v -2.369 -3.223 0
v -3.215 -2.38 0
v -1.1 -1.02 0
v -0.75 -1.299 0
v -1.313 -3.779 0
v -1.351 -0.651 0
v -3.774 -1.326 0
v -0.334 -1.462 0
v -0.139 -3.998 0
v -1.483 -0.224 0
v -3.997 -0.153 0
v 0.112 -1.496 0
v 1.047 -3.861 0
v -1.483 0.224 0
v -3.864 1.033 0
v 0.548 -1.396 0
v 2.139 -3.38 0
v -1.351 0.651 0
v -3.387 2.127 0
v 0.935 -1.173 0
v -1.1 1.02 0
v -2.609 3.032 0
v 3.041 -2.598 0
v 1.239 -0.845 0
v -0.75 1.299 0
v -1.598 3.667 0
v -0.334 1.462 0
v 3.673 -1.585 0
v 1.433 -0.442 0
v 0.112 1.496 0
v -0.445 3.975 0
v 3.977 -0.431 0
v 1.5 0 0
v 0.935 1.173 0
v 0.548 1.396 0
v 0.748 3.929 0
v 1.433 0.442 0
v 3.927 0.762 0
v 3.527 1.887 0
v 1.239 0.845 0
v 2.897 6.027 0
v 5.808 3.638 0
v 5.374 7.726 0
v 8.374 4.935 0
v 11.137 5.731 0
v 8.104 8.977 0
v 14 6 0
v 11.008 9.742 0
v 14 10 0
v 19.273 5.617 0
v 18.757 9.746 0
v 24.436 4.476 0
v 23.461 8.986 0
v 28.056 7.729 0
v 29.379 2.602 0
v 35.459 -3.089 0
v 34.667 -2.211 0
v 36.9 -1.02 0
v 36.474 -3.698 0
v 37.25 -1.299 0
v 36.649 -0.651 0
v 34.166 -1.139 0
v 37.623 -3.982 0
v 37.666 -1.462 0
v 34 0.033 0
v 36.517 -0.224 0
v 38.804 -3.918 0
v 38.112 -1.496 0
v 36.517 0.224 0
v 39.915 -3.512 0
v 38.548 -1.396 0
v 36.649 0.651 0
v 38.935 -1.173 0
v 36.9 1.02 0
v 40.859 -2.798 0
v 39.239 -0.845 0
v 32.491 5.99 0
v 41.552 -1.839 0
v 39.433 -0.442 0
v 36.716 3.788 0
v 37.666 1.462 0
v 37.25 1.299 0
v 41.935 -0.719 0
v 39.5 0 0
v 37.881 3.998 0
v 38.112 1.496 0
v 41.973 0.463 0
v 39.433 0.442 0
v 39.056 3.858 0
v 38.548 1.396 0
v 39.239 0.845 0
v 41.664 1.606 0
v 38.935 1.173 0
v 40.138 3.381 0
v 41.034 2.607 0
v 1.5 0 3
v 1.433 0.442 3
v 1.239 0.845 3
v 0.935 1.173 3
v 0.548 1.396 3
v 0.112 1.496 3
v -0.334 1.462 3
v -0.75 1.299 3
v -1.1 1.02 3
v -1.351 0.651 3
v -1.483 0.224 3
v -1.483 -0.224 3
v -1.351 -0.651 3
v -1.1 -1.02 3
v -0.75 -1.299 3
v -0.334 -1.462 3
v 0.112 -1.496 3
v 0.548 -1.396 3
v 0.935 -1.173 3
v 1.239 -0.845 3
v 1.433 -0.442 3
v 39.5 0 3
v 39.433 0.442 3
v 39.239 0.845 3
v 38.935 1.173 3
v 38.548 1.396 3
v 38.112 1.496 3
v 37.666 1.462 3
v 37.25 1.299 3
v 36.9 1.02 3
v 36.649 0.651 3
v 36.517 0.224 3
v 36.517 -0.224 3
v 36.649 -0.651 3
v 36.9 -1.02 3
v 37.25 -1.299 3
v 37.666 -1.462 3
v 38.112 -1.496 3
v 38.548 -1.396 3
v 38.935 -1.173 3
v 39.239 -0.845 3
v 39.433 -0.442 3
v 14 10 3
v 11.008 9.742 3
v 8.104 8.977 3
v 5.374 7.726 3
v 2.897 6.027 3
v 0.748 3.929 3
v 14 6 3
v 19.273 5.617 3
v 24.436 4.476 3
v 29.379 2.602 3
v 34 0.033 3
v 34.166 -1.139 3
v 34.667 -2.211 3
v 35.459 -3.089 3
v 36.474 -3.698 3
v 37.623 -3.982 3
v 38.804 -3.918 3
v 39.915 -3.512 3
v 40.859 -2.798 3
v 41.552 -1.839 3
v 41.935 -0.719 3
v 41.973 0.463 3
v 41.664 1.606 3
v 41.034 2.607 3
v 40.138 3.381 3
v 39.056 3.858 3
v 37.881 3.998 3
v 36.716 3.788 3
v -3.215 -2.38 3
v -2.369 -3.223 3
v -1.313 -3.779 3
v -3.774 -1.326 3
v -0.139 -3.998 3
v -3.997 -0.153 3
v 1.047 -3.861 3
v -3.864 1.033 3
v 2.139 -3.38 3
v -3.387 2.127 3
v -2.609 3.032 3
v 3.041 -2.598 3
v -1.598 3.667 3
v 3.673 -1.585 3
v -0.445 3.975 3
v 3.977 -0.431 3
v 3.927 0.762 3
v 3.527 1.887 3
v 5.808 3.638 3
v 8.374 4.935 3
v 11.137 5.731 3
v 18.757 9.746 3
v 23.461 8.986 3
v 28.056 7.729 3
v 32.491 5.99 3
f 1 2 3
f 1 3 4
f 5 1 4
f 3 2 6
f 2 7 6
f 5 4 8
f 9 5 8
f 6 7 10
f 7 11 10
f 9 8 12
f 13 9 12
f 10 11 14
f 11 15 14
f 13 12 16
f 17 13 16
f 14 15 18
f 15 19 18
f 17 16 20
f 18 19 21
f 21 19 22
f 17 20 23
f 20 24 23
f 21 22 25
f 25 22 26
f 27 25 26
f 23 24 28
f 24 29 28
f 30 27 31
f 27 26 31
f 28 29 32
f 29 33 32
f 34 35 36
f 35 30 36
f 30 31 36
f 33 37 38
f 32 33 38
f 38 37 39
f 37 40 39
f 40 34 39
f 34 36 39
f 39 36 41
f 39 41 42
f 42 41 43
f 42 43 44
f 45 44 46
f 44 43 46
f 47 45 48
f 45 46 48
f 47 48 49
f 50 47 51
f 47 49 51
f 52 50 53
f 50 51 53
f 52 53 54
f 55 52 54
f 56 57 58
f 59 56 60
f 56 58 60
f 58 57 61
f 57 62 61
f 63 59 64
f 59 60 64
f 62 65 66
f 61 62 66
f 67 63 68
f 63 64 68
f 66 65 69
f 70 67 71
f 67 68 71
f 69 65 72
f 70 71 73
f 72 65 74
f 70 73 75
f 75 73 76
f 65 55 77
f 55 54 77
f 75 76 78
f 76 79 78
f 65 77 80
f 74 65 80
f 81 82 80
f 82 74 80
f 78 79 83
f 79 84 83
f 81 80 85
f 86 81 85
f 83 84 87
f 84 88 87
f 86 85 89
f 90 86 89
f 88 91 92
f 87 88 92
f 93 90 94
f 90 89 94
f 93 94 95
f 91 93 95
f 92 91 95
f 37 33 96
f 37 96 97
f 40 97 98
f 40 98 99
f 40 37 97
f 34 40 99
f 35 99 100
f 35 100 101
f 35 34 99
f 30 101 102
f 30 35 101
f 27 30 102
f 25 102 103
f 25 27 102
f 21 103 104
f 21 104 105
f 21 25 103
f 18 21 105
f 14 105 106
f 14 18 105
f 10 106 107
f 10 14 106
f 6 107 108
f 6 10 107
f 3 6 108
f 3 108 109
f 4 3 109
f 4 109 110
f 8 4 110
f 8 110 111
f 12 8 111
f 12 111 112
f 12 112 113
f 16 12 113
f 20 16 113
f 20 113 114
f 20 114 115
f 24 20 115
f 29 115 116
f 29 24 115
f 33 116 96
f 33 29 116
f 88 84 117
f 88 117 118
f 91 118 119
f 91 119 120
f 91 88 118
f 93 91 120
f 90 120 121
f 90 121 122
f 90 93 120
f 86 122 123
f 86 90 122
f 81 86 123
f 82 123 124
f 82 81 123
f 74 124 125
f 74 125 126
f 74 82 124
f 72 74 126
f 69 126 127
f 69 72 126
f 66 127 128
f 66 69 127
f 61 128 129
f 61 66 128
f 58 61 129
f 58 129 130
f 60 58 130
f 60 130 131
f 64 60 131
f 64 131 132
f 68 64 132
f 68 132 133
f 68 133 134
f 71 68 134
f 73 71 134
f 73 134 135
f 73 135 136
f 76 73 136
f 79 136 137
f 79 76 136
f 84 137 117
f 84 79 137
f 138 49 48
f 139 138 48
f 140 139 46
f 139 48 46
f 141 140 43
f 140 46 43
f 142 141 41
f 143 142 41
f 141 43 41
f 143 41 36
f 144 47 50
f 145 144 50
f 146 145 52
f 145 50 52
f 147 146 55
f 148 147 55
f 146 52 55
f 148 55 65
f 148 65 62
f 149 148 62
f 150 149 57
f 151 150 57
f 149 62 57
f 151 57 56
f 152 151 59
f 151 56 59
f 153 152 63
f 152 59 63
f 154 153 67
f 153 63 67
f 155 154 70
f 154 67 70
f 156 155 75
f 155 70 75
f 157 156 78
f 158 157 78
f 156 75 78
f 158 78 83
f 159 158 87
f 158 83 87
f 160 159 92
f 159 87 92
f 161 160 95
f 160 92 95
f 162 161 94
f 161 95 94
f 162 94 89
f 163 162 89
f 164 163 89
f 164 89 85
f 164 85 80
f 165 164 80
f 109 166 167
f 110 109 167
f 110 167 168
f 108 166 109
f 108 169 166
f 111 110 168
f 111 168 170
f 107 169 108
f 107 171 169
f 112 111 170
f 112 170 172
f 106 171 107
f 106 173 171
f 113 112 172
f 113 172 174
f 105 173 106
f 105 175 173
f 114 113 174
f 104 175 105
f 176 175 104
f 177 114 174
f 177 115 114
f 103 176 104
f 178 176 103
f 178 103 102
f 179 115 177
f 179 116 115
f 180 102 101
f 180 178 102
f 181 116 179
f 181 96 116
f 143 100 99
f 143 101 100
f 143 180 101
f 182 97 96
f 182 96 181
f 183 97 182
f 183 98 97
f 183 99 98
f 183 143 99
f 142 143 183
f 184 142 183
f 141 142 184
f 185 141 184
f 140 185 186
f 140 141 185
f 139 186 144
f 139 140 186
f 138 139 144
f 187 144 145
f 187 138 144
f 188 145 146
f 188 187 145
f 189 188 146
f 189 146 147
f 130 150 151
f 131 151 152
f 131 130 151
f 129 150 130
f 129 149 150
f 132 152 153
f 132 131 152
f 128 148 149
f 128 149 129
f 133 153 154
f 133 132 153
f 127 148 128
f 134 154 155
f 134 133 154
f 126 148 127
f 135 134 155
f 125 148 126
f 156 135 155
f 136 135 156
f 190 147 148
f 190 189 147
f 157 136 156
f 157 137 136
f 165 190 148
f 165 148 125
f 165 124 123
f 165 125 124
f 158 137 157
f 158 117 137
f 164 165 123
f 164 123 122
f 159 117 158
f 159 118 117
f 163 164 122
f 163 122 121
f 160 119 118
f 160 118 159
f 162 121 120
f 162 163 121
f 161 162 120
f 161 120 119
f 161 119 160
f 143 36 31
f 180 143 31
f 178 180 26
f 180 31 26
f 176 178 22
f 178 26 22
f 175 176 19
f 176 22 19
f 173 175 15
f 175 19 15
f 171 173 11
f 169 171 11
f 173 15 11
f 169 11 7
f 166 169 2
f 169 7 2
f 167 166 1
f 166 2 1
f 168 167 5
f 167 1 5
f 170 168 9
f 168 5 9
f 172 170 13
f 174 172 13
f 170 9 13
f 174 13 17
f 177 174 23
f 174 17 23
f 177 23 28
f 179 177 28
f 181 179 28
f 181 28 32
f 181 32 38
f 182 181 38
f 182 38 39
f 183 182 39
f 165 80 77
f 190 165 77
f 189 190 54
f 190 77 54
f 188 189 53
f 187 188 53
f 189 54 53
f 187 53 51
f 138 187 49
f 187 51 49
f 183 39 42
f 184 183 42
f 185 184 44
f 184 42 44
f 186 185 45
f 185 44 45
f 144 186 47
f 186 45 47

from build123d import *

# Parameters (mm, degrees)
CROQUIS1_R              = 1.5
SALIENTE_EXTRUIR1_DEPTH = 3


with BuildPart() as part:
    # Croquis1 → Saliente-Extruir1 (new body)
    with BuildSketch(Plane.XY):
        with BuildLine():
            ThreePointArc((14, 6), (24.435686691, 4.476369784), (34.000133515, 0.032681824))
            ThreePointArc((34.000133515, 0.032681824), (41.241241669, -2.344003507), (36.716180593, 3.788377981))
            ThreePointArc((36.716180593, 3.788377981), (25.775070157, 8.419103062), (14, 10))
            ThreePointArc((14, 10), (6.711840205, 8.410145405), (0.74792205, 3.929454492))
            ThreePointArc((0.74792205, 3.929454492), (-2.369034826, -3.222991466), (3.52713505, 1.886615578))
            ThreePointArc((3.52713505, 1.886615578), (8.37414825, 4.934787082), (14, 6))
        make_face()
        Circle(CROQUIS1_R, mode=Mode.SUBTRACT)
        with Locations((38, 0)):
            Circle(CROQUIS1_R, mode=Mode.SUBTRACT)
    extrude(amount=SALIENTE_EXTRUIR1_DEPTH)


solid = part.part
